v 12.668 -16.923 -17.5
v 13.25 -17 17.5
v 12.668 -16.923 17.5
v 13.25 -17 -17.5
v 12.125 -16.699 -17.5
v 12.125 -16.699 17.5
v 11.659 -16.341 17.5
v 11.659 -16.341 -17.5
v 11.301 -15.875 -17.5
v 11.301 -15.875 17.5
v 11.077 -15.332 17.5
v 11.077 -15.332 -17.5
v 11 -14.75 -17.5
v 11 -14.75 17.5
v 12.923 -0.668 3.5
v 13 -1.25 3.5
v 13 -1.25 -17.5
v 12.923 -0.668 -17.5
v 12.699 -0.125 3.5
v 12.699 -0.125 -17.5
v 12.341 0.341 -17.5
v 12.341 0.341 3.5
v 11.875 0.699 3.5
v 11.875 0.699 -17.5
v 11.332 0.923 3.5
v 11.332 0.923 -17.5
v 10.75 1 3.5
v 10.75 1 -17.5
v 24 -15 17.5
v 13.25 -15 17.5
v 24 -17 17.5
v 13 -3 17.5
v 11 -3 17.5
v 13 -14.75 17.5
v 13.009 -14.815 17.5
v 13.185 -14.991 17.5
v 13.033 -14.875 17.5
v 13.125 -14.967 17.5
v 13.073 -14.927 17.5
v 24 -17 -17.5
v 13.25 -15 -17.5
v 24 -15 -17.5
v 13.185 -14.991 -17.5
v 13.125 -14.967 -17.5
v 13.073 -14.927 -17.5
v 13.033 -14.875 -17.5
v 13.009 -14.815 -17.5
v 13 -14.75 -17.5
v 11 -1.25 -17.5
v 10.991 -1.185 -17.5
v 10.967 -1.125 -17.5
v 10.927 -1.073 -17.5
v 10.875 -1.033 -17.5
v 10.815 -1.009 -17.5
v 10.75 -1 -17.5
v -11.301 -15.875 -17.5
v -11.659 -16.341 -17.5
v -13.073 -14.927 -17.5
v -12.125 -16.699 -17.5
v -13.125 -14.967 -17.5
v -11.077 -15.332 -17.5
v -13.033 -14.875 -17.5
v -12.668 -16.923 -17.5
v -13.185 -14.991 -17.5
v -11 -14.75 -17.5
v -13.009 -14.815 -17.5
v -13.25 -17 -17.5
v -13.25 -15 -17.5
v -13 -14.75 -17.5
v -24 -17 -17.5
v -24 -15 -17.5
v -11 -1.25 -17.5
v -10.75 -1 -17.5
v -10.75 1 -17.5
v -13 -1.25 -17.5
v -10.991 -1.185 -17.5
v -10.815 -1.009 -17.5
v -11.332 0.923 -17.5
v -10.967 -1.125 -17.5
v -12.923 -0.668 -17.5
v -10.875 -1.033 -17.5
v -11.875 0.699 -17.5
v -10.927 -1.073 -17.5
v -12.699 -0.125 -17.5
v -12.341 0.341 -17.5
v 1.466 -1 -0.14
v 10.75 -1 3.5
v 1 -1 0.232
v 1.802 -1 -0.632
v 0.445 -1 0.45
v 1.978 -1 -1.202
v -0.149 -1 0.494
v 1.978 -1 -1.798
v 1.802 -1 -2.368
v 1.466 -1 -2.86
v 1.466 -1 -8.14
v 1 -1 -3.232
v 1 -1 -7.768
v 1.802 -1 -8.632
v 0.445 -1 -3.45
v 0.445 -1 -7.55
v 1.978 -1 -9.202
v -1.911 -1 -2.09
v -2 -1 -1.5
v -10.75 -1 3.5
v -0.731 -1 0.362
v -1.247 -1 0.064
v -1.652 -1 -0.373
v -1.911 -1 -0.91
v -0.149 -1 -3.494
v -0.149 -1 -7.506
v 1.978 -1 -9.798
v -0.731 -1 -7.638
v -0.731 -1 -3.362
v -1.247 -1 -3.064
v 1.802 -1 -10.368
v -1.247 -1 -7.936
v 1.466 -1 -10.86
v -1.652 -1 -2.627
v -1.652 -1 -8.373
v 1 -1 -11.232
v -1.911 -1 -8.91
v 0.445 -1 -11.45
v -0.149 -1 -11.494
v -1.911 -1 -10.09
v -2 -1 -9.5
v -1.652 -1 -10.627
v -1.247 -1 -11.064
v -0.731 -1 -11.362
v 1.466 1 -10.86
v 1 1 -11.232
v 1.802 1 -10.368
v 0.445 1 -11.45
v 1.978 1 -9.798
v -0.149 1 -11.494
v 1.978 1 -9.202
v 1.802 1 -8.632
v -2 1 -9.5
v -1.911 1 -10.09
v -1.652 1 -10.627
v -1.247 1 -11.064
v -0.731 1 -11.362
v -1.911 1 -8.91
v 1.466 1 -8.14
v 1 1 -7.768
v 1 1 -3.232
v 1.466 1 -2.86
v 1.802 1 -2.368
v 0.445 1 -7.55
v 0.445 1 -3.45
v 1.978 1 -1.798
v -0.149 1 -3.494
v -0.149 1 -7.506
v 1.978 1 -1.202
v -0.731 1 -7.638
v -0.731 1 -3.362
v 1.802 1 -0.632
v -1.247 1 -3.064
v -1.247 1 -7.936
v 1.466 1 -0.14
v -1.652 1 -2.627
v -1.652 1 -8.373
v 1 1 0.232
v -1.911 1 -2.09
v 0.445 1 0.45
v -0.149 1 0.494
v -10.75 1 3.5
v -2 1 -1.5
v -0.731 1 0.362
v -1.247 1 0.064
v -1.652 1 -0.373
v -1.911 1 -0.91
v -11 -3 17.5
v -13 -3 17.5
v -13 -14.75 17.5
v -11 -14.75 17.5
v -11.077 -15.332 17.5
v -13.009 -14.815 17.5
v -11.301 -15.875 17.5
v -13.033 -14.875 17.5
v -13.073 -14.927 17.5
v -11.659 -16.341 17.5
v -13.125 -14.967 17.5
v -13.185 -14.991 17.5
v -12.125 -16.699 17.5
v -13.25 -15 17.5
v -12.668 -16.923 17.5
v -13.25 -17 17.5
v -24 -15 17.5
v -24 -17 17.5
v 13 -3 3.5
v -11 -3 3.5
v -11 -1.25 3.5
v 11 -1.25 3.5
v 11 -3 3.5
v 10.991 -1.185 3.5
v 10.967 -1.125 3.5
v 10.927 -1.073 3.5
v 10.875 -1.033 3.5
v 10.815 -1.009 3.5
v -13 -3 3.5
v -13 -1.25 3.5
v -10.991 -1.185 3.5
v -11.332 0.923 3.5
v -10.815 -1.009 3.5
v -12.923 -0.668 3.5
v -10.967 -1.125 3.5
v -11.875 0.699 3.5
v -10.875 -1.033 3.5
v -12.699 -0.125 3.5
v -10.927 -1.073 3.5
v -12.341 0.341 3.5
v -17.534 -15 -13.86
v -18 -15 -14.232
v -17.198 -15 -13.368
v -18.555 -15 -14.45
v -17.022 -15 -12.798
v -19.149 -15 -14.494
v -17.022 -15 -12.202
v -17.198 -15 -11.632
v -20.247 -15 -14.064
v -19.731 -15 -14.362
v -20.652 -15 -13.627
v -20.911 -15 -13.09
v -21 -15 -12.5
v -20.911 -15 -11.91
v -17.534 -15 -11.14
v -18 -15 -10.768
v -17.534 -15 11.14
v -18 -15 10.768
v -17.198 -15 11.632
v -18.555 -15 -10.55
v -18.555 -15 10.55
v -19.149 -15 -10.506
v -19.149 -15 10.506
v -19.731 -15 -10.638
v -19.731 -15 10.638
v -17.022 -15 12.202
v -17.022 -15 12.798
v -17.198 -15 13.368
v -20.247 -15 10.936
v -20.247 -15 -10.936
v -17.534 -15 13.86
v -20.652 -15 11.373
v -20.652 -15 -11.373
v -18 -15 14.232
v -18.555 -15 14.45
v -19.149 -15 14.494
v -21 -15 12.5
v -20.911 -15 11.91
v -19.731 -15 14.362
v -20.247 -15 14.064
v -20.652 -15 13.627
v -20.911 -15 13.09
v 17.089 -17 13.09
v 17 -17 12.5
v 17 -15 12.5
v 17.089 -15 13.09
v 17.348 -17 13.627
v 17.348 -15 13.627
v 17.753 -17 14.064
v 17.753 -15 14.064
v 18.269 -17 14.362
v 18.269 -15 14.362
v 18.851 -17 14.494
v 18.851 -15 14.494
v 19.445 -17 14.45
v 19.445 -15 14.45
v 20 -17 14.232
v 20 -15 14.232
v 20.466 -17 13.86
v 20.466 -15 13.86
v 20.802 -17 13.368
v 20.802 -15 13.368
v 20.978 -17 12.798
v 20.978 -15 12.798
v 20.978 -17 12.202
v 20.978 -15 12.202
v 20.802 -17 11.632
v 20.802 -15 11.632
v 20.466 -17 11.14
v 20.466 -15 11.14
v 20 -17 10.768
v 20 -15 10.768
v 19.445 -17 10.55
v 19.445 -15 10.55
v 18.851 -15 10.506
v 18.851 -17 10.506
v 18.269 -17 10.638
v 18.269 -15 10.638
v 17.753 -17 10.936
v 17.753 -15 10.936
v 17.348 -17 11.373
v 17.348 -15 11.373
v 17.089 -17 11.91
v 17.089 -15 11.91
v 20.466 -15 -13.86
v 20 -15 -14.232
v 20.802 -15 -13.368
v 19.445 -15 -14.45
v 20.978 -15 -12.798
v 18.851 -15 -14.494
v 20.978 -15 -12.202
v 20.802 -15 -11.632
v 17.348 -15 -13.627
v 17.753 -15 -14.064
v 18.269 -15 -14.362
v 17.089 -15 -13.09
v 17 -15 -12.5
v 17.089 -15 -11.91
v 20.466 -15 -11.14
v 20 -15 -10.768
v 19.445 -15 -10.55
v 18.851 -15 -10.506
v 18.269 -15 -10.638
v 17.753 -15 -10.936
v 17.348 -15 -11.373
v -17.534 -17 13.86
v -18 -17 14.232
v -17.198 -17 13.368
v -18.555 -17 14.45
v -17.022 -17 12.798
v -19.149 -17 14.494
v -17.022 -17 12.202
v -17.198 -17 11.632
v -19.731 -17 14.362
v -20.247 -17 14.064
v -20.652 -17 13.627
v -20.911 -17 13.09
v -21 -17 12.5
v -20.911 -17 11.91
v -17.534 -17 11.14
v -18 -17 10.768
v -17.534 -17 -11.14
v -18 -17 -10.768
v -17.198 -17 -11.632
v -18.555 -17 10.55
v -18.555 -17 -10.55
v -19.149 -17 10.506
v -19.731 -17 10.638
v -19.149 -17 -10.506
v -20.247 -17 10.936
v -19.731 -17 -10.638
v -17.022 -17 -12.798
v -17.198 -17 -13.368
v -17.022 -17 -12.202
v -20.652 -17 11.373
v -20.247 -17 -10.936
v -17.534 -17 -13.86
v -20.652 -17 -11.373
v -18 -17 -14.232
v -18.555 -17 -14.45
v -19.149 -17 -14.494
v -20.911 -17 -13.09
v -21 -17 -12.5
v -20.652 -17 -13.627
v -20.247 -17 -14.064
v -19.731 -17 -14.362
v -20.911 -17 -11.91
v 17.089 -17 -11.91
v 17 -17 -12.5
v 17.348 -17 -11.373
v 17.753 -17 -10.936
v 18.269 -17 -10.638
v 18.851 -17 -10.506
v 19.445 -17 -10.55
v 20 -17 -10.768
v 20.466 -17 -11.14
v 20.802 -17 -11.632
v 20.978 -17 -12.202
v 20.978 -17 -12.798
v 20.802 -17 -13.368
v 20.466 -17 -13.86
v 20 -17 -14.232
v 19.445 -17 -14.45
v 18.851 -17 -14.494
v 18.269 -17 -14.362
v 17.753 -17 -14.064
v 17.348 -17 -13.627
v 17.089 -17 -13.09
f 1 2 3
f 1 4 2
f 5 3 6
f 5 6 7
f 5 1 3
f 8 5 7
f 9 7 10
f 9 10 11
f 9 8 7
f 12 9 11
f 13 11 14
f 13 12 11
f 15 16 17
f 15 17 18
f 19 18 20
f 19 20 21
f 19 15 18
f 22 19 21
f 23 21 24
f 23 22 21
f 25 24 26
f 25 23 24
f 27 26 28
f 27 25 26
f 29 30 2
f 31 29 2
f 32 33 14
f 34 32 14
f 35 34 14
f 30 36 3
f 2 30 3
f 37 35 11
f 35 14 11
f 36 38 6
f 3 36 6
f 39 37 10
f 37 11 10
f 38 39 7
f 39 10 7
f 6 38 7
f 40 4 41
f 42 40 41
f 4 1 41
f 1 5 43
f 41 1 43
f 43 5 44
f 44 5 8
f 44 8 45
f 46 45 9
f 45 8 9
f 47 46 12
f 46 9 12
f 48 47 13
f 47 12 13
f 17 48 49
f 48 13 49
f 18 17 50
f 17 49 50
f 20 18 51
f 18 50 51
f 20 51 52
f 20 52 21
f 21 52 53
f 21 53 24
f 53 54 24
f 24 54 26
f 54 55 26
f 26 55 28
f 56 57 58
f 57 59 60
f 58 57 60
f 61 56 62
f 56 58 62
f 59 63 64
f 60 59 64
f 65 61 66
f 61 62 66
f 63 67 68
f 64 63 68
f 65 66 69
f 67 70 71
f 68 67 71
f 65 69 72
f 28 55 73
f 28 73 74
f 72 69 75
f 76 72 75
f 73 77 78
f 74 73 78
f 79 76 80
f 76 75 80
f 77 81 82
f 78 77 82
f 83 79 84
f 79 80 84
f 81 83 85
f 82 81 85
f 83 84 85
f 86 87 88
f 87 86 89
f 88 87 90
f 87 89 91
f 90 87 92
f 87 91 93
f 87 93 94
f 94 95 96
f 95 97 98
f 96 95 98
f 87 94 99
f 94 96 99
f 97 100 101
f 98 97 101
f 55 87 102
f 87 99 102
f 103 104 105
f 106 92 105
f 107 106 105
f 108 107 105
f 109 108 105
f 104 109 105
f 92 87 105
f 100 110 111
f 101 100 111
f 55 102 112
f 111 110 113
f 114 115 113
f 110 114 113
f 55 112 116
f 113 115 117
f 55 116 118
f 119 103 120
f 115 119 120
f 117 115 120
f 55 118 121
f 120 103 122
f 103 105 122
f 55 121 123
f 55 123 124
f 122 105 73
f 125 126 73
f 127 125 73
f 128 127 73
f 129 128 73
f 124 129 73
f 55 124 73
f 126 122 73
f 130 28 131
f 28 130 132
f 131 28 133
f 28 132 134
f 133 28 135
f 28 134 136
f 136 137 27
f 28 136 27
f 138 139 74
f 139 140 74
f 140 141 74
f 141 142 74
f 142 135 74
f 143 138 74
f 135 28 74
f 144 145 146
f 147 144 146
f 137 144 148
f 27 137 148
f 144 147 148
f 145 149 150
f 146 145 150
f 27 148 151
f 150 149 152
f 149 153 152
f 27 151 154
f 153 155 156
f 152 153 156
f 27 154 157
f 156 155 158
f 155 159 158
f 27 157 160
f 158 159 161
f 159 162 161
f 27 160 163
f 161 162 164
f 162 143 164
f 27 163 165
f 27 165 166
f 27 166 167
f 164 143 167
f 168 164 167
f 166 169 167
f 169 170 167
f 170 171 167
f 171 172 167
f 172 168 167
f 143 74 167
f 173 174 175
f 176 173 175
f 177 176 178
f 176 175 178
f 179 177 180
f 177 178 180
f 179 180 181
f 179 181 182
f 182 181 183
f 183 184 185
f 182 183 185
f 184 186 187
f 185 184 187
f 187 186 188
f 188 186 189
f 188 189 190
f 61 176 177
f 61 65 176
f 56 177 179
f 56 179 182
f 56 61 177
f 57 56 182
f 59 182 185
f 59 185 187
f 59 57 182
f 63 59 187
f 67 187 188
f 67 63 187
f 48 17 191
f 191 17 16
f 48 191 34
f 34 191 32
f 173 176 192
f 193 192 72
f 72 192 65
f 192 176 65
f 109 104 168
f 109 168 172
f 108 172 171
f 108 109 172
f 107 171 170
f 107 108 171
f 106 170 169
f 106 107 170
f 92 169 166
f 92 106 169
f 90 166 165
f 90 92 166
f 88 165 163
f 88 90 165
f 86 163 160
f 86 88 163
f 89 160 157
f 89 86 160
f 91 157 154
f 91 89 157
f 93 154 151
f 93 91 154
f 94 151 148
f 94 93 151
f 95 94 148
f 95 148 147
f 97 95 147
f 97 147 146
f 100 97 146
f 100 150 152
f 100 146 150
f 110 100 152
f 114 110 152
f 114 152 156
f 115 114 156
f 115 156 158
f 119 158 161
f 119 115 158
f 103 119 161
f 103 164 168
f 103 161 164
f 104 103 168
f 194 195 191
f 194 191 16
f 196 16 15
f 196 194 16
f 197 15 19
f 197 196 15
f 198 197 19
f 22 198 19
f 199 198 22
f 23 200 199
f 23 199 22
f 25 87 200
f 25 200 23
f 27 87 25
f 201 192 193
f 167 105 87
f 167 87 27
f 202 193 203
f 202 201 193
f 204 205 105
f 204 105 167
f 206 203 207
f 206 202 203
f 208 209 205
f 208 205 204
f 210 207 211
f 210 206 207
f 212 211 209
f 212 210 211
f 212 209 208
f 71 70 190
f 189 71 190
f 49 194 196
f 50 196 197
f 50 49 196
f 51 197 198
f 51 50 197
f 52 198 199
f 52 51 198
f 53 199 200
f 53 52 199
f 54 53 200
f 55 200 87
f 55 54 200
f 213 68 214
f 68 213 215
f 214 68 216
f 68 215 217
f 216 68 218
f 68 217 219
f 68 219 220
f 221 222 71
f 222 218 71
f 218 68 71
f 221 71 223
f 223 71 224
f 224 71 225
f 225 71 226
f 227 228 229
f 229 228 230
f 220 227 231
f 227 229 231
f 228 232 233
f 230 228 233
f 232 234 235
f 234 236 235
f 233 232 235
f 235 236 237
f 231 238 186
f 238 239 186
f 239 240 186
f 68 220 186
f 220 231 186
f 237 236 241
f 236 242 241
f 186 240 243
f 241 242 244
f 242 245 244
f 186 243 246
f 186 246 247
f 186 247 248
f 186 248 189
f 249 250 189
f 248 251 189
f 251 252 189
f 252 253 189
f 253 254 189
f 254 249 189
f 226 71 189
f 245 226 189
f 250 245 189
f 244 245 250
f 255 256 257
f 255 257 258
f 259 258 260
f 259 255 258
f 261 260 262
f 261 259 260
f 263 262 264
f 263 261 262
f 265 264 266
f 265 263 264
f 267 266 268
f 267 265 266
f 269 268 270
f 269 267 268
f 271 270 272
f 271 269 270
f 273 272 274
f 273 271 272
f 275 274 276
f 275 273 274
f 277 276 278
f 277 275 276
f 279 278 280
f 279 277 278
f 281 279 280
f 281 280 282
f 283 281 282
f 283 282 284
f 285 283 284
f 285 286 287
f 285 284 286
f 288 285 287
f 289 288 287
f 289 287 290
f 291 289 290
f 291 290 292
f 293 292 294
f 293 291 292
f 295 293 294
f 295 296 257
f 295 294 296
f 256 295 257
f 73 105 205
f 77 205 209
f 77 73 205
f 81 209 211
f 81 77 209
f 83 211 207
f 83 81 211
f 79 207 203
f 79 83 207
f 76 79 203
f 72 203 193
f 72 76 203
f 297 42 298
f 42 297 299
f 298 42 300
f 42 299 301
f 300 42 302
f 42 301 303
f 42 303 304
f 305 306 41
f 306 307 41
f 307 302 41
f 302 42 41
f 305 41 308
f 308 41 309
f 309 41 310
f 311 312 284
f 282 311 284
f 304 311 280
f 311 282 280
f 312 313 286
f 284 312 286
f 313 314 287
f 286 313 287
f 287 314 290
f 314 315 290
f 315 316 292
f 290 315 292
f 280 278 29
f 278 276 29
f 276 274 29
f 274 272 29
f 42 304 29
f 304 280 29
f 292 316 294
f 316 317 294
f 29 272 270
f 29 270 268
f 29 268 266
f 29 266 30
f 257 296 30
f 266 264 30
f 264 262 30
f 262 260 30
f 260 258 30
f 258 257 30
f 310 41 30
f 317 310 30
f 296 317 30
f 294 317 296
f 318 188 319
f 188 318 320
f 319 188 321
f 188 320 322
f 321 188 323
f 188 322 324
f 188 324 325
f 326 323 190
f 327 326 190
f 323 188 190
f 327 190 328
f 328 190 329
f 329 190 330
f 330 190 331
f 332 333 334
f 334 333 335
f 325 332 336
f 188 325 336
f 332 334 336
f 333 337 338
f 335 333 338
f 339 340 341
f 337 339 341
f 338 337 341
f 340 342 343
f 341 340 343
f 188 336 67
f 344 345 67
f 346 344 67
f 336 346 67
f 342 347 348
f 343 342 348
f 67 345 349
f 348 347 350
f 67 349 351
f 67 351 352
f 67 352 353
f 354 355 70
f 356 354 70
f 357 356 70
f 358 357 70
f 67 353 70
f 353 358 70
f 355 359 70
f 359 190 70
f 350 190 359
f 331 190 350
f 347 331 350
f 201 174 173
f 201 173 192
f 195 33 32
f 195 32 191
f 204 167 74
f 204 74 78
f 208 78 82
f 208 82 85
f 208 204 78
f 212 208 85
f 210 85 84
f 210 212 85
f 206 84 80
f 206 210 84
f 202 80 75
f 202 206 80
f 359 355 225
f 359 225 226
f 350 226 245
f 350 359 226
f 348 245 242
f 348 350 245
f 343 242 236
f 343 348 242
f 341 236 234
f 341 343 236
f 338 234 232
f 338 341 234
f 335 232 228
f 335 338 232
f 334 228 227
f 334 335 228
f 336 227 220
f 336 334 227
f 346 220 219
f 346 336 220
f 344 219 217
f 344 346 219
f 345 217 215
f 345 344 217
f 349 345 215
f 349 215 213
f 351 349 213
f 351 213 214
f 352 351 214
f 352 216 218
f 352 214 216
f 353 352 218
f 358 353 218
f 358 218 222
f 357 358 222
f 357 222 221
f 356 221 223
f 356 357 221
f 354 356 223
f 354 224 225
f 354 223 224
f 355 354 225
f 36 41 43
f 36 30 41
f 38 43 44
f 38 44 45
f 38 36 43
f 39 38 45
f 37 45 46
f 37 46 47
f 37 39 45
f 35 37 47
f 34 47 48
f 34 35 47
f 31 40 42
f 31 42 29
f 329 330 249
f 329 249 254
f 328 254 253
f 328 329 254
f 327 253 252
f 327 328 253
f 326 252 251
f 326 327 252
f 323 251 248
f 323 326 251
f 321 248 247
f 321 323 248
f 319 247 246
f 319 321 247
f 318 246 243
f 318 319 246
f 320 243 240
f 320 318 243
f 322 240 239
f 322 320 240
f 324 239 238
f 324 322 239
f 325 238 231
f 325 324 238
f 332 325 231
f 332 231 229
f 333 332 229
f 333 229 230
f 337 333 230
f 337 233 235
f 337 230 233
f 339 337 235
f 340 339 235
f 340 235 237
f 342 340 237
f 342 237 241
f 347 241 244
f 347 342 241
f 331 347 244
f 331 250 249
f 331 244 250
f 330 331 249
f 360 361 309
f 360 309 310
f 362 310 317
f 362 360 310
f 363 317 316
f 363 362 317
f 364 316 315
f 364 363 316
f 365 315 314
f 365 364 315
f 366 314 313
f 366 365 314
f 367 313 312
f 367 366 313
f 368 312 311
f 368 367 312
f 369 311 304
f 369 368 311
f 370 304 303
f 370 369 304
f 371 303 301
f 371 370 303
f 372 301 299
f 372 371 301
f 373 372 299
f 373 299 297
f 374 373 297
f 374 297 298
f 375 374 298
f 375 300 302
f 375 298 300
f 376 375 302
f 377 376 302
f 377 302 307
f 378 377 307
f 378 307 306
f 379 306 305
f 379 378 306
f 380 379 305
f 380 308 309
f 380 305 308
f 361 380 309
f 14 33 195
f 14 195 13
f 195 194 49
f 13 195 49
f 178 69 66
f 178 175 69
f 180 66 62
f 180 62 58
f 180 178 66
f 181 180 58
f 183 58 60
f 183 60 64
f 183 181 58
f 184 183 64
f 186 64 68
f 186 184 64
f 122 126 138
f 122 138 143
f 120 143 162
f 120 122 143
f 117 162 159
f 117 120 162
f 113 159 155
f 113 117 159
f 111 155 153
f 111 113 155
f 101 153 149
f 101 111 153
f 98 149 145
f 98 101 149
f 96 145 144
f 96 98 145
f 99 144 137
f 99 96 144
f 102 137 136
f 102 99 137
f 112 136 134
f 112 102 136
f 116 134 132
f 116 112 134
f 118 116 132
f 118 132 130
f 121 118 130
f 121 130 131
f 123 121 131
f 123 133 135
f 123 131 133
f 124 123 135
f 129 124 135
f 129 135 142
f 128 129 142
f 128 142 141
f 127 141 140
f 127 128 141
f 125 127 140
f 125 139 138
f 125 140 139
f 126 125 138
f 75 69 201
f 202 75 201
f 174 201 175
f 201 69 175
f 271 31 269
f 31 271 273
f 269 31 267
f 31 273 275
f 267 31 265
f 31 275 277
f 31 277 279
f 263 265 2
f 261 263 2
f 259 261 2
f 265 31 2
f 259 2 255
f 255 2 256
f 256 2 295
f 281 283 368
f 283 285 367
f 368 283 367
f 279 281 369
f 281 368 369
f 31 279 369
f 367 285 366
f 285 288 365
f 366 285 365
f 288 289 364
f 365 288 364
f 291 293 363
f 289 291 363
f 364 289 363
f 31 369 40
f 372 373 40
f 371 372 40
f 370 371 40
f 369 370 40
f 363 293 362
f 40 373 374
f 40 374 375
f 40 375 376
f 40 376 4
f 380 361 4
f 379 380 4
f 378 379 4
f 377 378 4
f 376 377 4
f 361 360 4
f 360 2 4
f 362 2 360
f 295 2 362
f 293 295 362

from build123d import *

# Parameters (mm, degrees)
SKETCH2_W               = 35
SKETCH2_H               = 2
CUT_EXTRUDE1_DEPTH      = 35.223529917
CUT_EXTRUDE1_DEPTH_BACK = 35.223529917
SKETCH3_W               = 14
SKETCH3_H               = 4
CUT_EXTRUDE2_DEPTH      = 35.731109974
CUT_EXTRUDE2_DEPTH_BACK = 35.731109974
SKETCH4_R               = 2


with BuildPart() as part:
    # Sweep1: sweep along a path in Sketch1
    with BuildLine(Plane.XY) as sweep1_path:
        Line((24, -16), (13.25, -16))
        ThreePointArc((13.25, -16), (12.366116524, -15.633883476), (12, -14.75))
        Line((12, -14.75), (12, -1.25))
        ThreePointArc((12, -1.25), (11.633883476, -0.366116524), (10.75, 0))
        Line((10.75, 0), (-10.75, 0))
        ThreePointArc((-10.75, 0), (-11.633883476, -0.366116524), (-12, -1.25))
        Line((-12, -1.25), (-12, -14.75))
        ThreePointArc((-12, -14.75), (-12.366116524, -15.633883476), (-13.25, -16))
        Line((-13.25, -16), (-24, -16))
    # Sketch2 → Sweep1 (sweep)
    with BuildSketch(Plane(origin=(0, 0, 0), x_dir=(0, 0, -1), z_dir=(1, 0, 0))):
        Rectangle(SKETCH2_W, SKETCH2_H)
    sweep(path=sweep1_path.line)

    # Sketch3 → Cut-Extrude1 (cut, two sides: drawn at the far end of the back side and taken through both)
    with BuildSketch(Plane(origin=(0, 0, 0), x_dir=(0, 0, -1), z_dir=(1, 0, 0)).offset(-CUT_EXTRUDE1_DEPTH_BACK)):
        with Locations((-10.5, -1)):
            Rectangle(SKETCH3_W, SKETCH3_H)
    extrude(amount=CUT_EXTRUDE1_DEPTH + CUT_EXTRUDE1_DEPTH_BACK, mode=Mode.SUBTRACT)

    # Sketch4 → Cut-Extrude2 (cut, two sides: drawn at the far end of the back side and taken through both)
    with BuildSketch(Plane(origin=(0, 1, 0), x_dir=(1, 0, 0), z_dir=(0, 1, 0)).offset(-CUT_EXTRUDE2_DEPTH_BACK)):
        with Locations(Location((0, 1.5, 0), (0, 0, 180))):
            Circle(SKETCH4_R)
        with Locations(Location((0, 9.5, 0), (0, 0, 180))):
            Circle(SKETCH4_R)
        with Locations(Location((-19, 12.5, 0), (0, 0, 180))):
            Circle(SKETCH4_R)
        with Locations(Location((-19, -12.5, 0), (0, 0, 180))):
            Circle(SKETCH4_R)
        with Locations(Location((19, -12.5, 0), (0, 0, 180))):
            Circle(SKETCH4_R)
        with Locations(Location((19, 12.5, 0), (0, 0, 180))):
            Circle(SKETCH4_R)
    extrude(amount=CUT_EXTRUDE2_DEPTH + CUT_EXTRUDE2_DEPTH_BACK, mode=Mode.SUBTRACT)


solid = part.part
